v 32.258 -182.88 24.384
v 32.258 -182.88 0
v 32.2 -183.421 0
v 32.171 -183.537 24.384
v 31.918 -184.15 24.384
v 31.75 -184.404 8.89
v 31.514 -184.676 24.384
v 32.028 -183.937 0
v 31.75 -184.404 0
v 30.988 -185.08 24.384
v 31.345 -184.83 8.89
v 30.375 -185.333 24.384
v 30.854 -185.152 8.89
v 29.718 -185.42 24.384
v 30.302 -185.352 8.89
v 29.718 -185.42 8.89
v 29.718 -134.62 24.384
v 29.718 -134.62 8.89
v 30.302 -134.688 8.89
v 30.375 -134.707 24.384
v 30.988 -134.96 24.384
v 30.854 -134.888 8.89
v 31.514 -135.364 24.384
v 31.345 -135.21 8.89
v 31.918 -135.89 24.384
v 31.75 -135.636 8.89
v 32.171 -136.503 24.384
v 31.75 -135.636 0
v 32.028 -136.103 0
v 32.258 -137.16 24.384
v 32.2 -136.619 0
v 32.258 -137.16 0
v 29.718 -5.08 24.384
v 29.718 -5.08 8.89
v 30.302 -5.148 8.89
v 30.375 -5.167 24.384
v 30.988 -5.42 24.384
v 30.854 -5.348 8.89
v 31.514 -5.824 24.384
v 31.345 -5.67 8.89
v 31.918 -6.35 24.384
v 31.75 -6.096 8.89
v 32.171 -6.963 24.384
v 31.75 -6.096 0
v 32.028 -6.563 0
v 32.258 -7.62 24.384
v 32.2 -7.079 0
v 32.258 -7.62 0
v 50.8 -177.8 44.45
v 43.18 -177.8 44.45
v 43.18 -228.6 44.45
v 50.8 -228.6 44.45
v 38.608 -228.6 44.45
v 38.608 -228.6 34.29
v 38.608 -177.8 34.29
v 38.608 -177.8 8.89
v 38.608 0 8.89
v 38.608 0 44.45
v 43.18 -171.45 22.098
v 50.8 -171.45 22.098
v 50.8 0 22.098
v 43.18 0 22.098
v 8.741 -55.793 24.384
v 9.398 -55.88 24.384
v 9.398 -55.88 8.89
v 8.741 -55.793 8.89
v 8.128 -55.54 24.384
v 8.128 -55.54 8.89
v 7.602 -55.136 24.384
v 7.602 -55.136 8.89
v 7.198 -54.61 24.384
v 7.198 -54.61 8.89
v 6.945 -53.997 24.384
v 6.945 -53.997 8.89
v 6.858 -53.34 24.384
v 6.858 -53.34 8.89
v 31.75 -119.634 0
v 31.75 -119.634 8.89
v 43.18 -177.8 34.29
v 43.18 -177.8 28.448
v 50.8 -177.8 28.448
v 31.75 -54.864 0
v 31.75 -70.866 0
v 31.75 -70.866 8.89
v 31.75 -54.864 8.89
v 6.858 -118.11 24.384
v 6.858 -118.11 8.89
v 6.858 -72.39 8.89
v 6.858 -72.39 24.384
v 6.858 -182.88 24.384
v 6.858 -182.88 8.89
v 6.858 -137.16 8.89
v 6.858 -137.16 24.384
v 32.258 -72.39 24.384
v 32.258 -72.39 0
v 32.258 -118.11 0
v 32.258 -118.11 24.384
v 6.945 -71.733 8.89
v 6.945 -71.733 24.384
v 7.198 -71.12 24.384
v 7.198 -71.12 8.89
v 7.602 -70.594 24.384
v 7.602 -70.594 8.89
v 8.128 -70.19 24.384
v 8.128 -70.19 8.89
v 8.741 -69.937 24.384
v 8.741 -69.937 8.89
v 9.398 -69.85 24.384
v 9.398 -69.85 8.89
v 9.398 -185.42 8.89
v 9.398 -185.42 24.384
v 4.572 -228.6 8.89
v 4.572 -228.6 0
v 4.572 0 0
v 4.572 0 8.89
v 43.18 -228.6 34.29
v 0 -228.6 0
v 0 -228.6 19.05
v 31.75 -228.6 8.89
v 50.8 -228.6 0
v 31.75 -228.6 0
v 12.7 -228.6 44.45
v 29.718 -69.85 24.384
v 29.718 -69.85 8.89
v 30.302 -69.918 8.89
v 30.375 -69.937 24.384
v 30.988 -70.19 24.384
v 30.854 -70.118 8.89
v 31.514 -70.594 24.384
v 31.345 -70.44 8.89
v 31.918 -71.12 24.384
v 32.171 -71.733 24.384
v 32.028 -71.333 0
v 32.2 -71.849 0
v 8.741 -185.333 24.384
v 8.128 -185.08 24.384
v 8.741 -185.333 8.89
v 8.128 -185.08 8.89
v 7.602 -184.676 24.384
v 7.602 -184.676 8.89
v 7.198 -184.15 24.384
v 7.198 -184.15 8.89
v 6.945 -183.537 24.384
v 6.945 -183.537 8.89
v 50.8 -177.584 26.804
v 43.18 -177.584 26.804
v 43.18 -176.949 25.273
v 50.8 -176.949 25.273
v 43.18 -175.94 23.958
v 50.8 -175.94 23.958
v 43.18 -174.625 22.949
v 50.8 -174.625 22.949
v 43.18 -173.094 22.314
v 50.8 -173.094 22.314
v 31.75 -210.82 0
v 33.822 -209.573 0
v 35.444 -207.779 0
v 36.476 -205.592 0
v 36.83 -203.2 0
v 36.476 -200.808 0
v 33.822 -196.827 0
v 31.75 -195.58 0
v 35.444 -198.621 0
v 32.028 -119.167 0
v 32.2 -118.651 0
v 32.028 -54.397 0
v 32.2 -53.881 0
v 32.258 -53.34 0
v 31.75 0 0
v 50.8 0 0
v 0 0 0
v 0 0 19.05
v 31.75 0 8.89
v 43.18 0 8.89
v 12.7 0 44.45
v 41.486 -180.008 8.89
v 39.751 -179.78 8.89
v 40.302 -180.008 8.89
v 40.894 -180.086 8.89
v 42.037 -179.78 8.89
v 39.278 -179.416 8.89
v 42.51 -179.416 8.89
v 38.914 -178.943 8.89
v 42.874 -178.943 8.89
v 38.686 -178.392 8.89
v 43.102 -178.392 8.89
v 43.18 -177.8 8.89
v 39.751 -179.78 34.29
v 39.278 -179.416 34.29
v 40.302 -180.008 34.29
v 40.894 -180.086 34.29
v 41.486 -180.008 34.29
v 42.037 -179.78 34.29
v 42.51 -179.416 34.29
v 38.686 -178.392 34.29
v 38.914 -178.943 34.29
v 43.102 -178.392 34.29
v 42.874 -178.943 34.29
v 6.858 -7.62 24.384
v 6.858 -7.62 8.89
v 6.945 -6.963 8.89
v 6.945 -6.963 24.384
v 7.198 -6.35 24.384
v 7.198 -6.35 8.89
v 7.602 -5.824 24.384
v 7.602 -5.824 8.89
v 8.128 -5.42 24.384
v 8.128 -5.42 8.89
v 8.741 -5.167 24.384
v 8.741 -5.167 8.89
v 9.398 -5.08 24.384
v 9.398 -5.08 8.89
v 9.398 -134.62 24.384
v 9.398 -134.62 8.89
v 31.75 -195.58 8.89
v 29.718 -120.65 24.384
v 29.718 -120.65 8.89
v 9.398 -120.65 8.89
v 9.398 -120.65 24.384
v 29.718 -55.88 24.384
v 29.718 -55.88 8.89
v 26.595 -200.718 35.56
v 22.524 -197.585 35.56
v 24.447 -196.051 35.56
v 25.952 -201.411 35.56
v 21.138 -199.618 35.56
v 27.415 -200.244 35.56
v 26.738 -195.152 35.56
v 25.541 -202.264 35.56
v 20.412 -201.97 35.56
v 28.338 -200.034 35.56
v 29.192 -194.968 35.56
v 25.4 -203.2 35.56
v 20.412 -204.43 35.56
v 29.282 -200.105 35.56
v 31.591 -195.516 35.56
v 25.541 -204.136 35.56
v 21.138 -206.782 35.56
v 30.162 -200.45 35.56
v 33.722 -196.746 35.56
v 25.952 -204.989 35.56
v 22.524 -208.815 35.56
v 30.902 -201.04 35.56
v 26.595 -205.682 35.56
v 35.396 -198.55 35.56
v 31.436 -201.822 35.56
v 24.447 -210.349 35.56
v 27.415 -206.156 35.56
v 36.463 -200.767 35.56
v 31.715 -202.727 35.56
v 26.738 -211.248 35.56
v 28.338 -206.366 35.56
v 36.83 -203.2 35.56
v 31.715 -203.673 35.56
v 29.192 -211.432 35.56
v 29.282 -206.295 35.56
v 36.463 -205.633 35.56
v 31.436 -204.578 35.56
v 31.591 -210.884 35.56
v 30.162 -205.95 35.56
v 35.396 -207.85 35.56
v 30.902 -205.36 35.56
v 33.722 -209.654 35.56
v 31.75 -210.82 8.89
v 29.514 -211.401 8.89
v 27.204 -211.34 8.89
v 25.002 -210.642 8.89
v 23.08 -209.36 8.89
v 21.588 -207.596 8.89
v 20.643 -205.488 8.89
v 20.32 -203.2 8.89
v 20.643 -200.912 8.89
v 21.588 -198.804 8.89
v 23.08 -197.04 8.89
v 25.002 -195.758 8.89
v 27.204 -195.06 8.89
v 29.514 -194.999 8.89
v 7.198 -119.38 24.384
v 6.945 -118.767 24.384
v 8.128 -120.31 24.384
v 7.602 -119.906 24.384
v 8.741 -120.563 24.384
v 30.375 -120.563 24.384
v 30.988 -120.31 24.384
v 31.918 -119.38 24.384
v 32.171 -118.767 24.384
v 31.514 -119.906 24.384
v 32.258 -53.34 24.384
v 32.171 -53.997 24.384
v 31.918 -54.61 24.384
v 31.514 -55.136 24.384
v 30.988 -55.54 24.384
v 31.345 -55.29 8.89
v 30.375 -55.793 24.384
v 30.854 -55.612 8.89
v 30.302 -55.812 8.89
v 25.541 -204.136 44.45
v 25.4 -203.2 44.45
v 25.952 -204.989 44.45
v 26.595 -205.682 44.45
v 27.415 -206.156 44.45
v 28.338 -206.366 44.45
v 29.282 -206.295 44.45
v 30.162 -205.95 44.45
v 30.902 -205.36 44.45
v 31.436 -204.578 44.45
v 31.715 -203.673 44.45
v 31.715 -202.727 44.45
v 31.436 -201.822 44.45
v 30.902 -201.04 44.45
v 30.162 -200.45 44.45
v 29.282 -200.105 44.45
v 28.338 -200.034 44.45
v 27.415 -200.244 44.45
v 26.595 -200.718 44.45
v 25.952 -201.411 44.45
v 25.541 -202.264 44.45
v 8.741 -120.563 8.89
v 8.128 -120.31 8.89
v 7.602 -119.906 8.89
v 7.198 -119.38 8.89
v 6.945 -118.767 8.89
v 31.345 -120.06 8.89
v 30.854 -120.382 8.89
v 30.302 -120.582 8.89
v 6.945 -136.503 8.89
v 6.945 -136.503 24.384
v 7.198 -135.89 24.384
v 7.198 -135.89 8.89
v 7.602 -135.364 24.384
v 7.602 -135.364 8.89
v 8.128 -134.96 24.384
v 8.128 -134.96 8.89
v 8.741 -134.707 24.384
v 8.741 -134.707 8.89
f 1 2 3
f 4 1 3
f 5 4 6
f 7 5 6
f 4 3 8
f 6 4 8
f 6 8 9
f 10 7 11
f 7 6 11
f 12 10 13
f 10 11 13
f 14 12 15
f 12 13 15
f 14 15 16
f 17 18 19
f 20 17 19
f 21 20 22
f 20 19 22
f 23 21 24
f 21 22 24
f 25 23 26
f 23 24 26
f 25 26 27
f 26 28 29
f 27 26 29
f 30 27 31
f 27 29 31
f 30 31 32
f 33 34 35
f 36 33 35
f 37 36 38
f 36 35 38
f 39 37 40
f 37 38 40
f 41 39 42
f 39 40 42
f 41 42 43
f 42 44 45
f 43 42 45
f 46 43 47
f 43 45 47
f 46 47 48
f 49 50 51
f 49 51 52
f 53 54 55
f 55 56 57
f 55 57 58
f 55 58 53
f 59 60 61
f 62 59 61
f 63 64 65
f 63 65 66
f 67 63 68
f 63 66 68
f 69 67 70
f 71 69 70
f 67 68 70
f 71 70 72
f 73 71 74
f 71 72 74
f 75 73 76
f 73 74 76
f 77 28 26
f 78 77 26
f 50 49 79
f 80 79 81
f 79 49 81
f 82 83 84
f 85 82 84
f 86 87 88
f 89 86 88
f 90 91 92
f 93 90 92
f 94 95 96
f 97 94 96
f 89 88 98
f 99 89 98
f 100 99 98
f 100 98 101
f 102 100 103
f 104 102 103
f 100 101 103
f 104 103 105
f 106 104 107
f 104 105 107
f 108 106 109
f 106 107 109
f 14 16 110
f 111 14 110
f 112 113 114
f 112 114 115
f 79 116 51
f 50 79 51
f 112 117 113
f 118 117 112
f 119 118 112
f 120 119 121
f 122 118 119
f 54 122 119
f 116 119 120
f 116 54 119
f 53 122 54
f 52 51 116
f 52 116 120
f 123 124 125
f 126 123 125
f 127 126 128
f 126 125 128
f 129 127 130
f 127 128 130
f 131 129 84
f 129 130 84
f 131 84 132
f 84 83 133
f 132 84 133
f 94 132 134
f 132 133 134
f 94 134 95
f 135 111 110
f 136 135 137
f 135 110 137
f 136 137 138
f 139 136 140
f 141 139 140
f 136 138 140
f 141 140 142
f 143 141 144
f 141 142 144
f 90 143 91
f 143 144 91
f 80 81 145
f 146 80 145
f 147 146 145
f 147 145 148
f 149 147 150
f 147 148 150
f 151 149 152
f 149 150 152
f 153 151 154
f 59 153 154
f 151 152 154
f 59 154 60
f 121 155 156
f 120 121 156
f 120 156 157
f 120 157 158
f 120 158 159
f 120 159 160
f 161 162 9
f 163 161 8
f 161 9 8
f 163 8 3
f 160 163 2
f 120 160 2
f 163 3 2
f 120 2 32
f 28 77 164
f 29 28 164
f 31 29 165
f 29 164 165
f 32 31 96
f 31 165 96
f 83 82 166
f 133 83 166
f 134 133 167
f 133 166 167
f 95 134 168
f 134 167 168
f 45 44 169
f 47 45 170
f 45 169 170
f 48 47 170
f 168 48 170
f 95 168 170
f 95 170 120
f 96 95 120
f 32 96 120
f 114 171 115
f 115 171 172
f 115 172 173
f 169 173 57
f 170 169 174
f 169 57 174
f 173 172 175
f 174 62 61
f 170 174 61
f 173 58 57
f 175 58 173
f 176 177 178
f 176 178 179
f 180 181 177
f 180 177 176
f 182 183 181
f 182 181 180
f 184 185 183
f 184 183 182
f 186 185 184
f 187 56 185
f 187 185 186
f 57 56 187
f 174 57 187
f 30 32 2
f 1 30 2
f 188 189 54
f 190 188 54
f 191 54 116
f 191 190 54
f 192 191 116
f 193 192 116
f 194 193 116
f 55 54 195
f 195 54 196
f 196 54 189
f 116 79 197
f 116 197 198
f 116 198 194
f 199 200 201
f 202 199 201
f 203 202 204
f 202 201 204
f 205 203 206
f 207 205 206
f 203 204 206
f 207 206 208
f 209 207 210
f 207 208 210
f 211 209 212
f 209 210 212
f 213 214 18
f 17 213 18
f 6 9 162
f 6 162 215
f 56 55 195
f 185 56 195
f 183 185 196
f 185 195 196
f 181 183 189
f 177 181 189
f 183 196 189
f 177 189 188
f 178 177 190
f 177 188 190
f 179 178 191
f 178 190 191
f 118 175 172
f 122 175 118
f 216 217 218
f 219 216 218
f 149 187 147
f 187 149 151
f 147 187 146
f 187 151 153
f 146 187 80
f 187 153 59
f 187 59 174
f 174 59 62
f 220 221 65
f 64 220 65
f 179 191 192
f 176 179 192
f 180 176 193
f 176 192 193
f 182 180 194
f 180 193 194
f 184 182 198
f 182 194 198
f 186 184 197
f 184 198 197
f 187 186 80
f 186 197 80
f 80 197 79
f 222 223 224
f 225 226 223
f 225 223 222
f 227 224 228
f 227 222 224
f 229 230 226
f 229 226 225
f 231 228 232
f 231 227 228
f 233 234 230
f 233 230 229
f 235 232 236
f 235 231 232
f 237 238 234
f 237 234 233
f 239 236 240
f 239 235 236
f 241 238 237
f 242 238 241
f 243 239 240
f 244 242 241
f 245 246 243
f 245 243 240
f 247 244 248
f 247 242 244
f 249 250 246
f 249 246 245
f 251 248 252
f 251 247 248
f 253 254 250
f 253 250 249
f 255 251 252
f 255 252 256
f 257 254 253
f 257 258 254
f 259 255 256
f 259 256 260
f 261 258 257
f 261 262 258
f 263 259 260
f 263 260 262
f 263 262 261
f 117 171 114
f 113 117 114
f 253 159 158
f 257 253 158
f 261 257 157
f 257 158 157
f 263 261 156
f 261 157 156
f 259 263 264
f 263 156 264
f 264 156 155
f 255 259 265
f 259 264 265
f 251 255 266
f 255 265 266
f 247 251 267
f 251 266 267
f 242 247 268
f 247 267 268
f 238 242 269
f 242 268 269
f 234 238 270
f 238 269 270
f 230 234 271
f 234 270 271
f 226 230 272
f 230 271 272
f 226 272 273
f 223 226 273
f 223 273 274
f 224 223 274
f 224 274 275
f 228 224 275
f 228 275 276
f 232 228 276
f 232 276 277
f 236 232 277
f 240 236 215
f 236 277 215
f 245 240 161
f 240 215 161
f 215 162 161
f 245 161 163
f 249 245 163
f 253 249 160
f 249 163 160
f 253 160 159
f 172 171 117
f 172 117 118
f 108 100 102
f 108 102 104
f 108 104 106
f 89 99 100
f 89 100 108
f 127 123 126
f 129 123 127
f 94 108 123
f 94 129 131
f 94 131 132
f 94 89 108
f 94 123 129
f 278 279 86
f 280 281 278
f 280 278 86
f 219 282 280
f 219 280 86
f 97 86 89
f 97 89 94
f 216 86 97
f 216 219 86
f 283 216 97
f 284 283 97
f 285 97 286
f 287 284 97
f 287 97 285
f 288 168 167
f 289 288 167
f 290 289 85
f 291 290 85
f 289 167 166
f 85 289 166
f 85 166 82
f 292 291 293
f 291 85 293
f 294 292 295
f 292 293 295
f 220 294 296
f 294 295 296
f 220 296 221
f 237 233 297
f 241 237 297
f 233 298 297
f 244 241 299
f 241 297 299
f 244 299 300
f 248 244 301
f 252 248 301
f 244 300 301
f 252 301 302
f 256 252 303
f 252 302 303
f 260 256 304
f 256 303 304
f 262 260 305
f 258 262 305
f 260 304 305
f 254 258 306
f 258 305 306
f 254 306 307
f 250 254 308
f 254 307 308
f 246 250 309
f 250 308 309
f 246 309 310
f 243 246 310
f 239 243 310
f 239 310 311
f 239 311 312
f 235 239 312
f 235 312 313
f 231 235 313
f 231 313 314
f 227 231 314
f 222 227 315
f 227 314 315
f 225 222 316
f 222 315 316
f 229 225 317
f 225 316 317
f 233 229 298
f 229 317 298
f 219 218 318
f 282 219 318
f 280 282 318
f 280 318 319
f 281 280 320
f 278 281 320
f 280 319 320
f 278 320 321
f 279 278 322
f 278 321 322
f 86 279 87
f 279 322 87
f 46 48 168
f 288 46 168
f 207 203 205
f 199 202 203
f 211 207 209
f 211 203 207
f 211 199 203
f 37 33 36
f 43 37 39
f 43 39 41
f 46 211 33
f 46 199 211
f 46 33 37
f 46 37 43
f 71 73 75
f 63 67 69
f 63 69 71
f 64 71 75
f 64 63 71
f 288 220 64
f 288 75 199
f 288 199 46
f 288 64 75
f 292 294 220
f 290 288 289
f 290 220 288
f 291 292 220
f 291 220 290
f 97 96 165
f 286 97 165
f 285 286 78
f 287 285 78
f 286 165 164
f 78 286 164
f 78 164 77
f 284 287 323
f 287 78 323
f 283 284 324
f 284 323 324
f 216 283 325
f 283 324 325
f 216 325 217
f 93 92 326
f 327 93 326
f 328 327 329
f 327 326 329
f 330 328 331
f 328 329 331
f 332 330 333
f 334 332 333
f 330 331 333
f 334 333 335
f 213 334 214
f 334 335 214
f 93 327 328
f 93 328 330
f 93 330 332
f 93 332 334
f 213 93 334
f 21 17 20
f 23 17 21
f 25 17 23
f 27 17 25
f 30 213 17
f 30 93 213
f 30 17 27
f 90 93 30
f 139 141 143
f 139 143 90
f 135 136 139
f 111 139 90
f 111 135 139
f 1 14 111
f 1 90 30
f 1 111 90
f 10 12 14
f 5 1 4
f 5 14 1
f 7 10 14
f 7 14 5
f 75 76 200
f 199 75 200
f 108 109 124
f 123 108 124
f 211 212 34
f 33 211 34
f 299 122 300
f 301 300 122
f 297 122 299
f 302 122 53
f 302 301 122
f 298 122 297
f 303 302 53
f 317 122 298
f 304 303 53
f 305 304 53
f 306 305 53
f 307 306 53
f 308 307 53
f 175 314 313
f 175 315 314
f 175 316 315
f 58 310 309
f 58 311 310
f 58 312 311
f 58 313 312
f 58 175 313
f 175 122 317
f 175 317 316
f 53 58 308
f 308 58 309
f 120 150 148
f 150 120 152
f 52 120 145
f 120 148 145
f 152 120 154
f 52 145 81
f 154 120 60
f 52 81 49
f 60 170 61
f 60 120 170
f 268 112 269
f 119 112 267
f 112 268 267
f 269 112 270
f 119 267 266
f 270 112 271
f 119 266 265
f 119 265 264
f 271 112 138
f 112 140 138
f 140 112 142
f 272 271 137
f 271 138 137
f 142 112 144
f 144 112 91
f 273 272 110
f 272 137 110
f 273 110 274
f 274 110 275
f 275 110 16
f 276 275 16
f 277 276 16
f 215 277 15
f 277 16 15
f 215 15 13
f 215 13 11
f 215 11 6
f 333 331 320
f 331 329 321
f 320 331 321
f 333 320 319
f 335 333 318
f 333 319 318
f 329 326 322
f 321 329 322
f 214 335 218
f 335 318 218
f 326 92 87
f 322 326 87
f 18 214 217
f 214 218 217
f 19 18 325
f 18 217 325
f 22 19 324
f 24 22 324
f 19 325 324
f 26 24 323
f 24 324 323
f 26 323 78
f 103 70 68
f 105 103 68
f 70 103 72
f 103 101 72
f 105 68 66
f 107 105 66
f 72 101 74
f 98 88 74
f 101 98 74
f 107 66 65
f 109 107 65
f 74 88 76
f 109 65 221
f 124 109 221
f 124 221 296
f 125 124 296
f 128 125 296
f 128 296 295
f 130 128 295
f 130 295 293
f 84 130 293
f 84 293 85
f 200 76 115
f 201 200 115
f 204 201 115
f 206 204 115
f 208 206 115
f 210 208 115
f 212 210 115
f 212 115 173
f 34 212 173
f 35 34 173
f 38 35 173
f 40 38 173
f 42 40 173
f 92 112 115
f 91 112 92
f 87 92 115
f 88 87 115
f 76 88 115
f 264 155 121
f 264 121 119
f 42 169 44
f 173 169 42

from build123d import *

# Parameters (mm, degrees)
F0_W            = 50.8
F0_H            = 44.45
F3_DEPTH        = 228.6
F4_SIZE2        = 12.7
F4_SIZE         = 25.4
F1_W            = 27.178
F1_H            = 8.89
F5_DEPTH        = 228.6
F2_W            = 4.572
F2_H            = 10.16
F6_DEPTH        = 228.6
F8_DEPTH        = 24.384
F9_W            = 2.364222
F9_H            = 0.78807
F10_DEPTH       = 12.192
F12_DEPTH       = 35.56
F14_D           = 6.35
F14_CBORE_D     = 16.51
F14_CBORE_DEPTH = 35.56


with BuildPart() as f3:
    # F0 (on Front) → F3 (new body)
    with BuildSketch(Plane.XZ):
        with Locations((25.4, 22.225)):
            Rectangle(F0_W, F0_H)
    extrude(amount=F3_DEPTH)

    # F4
    f4_edges = [f3.edges().sort_by_distance(p)[0] for p in [
        (0, -114.3, 44.45),
    ]]
    chamfer(f4_edges, length=F4_SIZE, length2=F4_SIZE2)

    # F1 (on Front) → F5 (cut)
    with BuildSketch(Plane.XZ):
        with Locations((18.161, 4.445)):
            Rectangle(F1_W, F1_H)
    extrude(amount=F5_DEPTH, mode=Mode.SUBTRACT)

    # F2 (on Front) → F6 (cut)
    with BuildSketch(Plane.XZ):
        with Locations((40.894, 39.37)):
            Rectangle(F2_W, F2_H)
    extrude(amount=F6_DEPTH, mode=Mode.SUBTRACT)

    # F7 (on face) → F8 (cut)
    with BuildSketch(Plane(origin=(0, 0, 0), x_dir=(1, 0, 0), z_dir=(0, 0, -1))):
        with BuildLine():
            ThreePointArc((32.258, 53.34), (31.514051, 55.136051), (29.718, 55.88))
            Line((29.718, 55.88), (9.398, 55.88))
            ThreePointArc((9.398, 55.88), (7.601949, 55.136051), (6.858, 53.34))
            Line((6.858, 53.34), (6.858, 7.62))
            ThreePointArc((6.858, 7.62), (7.601949, 5.823949), (9.398, 5.08))
            Line((9.398, 5.08), (29.718, 5.08))
            ThreePointArc((29.718, 5.08), (31.514051, 5.823949), (32.258, 7.62))
            Line((32.258, 7.62), (32.258, 53.34))
        make_face()
        with BuildLine():
            ThreePointArc((32.258, 118.11), (31.514051, 119.906051), (29.718, 120.65))
            Line((29.718, 120.65), (9.398, 120.65))
            ThreePointArc((9.398, 120.65), (7.601949, 119.906051), (6.858, 118.11))
            Line((6.858, 118.11), (6.858, 72.39))
            ThreePointArc((6.858, 72.39), (7.601949, 70.593949), (9.398, 69.85))
            Line((9.398, 69.85), (29.718, 69.85))
            ThreePointArc((29.718, 69.85), (31.514051, 70.593949), (32.258, 72.39))
            Line((32.258, 72.39), (32.258, 118.11))
        make_face()
        with BuildLine():
            ThreePointArc((32.258, 182.88), (31.514051, 184.676051), (29.718, 185.42))
            Line((29.718, 185.42), (9.398, 185.42))
            ThreePointArc((9.398, 185.42), (7.601949, 184.676051), (6.858, 182.88))
            Line((6.858, 182.88), (6.858, 137.16))
            ThreePointArc((6.858, 137.16), (7.601949, 135.363949), (9.398, 134.62))
            Line((9.398, 134.62), (29.718, 134.62))
            ThreePointArc((29.718, 134.62), (31.514051, 135.363949), (32.258, 137.16))
            Line((32.258, 137.16), (32.258, 182.88))
        make_face()
    extrude(amount=-F8_DEPTH, mode=Mode.SUBTRACT)

    # F9 (on face) → F10 (cut)
    with BuildSketch(Plane.YZ.offset(50.8)):
        with BuildLine():
            Line((0, 22.098), (0, 44.45))
            Line((0, 44.45), (-177.8, 44.45))
            Line((-177.8, 44.45), (-177.8, 28.448))
            ThreePointArc((-177.8, 28.448), (-175.940128, 23.957872), (-171.45, 22.098))
            Line((-171.45, 22.098), (0, 22.098))
        make_face()
        with Locations((10.441655, 33.889506)):
            Rectangle(F9_W, F9_H)
    extrude(amount=-F10_DEPTH, mode=Mode.SUBTRACT)

    # F11 (on face) → F12 (cut)
    with BuildSketch(Plane.XY.offset(44.45)):
        with BuildLine():
            Line((43.18, 0), (38.608, 0))
            Line((38.608, 0), (38.608, -177.8))
            ThreePointArc((38.608, -177.8), (39.277554, -179.416446), (40.894, -180.086))
            ThreePointArc((40.894, -180.086), (42.510446, -179.416446), (43.18, -177.8))
            Line((43.18, -177.8), (43.18, 0))
        make_face()
    extrude(amount=-F12_DEPTH, mode=Mode.SUBTRACT)

    # F14 (through all)
    with Locations(Plane(origin=(0, 0, 0), x_dir=(1, 0, 0), z_dir=(0, 0, -1))):
        with Locations((28.575, 203.2)):
            CounterBoreHole(F14_D / 2, F14_CBORE_D / 2, F14_CBORE_DEPTH)


solid = f3.part
